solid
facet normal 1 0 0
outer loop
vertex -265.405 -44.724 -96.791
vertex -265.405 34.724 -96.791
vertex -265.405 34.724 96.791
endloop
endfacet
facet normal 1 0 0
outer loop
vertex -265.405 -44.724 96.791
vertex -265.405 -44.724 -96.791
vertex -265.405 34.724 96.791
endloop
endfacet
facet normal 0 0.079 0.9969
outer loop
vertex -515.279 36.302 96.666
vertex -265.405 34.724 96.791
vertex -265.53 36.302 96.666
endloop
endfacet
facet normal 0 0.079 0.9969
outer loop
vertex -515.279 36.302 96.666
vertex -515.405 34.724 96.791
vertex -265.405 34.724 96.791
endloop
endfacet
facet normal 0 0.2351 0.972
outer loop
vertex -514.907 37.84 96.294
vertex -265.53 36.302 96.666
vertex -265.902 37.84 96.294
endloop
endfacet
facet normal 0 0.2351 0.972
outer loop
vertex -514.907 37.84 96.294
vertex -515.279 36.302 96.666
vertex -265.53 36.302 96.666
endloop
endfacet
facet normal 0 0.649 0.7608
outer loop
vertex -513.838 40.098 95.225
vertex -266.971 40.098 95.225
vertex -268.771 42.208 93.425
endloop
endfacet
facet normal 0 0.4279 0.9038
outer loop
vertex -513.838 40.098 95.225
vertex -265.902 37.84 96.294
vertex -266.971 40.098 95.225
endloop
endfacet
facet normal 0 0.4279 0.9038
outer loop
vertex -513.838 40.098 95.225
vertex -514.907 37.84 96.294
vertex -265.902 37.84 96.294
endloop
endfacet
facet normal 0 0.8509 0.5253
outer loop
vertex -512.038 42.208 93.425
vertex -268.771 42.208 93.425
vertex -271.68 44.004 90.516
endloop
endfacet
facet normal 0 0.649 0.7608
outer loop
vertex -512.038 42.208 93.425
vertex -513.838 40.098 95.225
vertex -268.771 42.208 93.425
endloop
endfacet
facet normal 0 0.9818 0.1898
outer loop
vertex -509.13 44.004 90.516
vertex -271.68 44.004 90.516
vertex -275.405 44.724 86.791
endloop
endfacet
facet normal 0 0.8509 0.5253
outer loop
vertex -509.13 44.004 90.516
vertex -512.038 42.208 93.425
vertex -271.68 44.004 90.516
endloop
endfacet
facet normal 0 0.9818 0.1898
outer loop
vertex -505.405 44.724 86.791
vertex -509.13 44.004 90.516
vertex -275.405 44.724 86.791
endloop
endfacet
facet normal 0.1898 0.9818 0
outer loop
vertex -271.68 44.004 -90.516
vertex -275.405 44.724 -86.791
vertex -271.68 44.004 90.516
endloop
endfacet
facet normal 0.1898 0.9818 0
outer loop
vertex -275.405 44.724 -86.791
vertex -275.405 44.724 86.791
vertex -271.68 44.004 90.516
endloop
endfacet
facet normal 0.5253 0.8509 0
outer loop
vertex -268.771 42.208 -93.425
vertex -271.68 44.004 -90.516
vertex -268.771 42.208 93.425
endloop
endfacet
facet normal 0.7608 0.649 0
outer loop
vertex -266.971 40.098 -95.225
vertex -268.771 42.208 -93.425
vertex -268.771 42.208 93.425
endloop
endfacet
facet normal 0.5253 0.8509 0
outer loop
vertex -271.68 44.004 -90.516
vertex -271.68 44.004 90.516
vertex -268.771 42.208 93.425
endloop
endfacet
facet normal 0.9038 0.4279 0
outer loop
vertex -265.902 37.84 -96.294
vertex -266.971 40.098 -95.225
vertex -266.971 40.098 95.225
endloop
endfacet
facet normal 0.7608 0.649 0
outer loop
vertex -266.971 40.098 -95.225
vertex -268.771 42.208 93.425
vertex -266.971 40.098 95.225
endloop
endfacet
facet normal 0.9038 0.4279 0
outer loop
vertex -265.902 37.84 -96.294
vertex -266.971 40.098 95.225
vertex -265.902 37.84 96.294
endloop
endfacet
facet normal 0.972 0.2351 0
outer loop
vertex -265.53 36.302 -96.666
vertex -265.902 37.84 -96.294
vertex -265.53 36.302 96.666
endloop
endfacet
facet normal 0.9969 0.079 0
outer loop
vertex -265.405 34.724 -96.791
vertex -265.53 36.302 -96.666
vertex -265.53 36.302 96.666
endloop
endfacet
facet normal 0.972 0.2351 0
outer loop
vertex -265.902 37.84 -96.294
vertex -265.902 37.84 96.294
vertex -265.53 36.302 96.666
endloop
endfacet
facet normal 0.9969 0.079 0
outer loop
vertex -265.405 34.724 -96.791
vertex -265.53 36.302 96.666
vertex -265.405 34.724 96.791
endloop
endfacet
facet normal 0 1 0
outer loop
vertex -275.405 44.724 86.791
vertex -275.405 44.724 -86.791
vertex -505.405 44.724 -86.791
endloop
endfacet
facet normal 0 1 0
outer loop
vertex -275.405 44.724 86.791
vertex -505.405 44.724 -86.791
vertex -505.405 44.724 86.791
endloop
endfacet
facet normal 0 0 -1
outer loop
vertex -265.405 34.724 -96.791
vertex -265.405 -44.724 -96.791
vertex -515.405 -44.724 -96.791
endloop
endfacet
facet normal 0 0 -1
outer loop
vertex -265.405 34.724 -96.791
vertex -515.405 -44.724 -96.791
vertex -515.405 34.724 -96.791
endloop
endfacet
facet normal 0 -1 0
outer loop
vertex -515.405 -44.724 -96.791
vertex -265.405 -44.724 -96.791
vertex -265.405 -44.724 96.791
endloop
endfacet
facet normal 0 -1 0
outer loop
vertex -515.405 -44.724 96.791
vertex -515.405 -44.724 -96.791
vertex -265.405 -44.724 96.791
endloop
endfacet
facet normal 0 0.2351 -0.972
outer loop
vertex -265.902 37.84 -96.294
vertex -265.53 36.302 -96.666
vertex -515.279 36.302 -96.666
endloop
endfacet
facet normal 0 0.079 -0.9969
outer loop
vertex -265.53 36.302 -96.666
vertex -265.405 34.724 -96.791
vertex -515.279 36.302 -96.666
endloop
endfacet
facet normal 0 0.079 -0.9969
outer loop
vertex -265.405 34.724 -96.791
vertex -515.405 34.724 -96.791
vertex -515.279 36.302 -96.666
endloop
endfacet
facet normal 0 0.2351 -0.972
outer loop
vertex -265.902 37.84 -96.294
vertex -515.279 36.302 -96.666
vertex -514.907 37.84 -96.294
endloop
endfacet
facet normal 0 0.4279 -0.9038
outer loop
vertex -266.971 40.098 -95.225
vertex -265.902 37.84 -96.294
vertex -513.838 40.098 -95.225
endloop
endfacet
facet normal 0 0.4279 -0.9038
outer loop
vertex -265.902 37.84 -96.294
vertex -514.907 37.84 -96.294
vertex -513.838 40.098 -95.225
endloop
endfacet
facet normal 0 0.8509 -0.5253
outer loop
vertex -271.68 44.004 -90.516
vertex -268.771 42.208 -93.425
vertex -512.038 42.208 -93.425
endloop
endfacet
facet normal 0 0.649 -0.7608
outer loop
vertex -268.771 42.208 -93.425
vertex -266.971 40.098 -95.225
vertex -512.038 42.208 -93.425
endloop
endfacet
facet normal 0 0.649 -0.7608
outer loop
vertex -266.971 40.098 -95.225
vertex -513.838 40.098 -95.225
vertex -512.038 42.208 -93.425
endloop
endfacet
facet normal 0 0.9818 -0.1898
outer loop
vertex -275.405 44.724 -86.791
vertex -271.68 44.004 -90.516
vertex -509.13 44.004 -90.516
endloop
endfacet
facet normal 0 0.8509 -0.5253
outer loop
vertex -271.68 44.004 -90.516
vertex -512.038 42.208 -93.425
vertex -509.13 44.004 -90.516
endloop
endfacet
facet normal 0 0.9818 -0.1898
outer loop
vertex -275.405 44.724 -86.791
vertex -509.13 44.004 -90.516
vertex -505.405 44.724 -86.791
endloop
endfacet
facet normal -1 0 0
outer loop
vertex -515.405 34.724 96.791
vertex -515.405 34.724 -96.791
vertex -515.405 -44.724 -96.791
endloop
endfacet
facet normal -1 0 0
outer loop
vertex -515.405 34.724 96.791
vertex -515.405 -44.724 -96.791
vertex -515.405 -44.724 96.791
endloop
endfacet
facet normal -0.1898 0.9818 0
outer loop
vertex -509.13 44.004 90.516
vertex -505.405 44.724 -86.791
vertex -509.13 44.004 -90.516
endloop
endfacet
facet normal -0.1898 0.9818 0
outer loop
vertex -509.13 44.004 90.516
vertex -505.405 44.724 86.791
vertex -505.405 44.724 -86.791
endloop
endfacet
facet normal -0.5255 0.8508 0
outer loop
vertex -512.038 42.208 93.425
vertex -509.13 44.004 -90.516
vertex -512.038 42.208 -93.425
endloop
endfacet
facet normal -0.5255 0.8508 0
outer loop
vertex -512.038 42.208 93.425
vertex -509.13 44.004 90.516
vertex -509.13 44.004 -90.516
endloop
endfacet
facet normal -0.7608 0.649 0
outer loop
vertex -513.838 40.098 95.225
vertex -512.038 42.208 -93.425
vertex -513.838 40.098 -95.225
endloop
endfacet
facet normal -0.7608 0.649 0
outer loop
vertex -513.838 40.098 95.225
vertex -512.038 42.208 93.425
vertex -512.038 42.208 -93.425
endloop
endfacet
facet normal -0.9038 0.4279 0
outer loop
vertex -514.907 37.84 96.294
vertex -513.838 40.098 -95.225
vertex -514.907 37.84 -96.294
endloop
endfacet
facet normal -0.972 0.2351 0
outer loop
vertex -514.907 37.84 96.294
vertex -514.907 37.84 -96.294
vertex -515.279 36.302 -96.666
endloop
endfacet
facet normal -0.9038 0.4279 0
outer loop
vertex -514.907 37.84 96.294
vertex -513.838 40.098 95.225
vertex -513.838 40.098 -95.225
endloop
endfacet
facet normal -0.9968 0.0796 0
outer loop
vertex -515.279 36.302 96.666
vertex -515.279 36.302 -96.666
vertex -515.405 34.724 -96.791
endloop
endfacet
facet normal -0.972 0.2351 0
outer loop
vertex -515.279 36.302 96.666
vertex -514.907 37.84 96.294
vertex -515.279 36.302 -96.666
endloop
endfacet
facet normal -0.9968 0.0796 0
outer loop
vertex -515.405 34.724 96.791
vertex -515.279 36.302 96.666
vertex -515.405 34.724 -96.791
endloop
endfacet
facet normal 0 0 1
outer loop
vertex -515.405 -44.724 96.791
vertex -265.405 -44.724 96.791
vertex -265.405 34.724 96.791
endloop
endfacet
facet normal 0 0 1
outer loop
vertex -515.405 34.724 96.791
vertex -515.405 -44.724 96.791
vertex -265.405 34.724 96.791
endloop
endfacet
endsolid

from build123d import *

# Parameters (mm, degrees)
SKETCH2_W           = 193.582912504
SKETCH2_H           = 89.448307966
BOSS_EXTRUDE1_DEPTH = 250
FILLET1_R           = 10


with BuildPart() as part:
    # Sketch2 → Boss-Extrude1 (new body)
    with BuildSketch(Plane.ZY.offset(265.404534045)):
        Rectangle(SKETCH2_W, SKETCH2_H)
    extrude(amount=BOSS_EXTRUDE1_DEPTH)

    # Fillet1
    fillet1_edges = [part.edges().sort_by_distance(p)[0] for p in [
        (-265.404534045, 44.724153983, 0),
        (-515.404534045, 44.724153983, 0),
        (-390.404534045, 44.724153983, -96.791456252),
        (-390.404534045, 44.724153983, 96.791456252),
    ]]
    fillet(fillet1_edges, radius=FILLET1_R)


solid = part.part
